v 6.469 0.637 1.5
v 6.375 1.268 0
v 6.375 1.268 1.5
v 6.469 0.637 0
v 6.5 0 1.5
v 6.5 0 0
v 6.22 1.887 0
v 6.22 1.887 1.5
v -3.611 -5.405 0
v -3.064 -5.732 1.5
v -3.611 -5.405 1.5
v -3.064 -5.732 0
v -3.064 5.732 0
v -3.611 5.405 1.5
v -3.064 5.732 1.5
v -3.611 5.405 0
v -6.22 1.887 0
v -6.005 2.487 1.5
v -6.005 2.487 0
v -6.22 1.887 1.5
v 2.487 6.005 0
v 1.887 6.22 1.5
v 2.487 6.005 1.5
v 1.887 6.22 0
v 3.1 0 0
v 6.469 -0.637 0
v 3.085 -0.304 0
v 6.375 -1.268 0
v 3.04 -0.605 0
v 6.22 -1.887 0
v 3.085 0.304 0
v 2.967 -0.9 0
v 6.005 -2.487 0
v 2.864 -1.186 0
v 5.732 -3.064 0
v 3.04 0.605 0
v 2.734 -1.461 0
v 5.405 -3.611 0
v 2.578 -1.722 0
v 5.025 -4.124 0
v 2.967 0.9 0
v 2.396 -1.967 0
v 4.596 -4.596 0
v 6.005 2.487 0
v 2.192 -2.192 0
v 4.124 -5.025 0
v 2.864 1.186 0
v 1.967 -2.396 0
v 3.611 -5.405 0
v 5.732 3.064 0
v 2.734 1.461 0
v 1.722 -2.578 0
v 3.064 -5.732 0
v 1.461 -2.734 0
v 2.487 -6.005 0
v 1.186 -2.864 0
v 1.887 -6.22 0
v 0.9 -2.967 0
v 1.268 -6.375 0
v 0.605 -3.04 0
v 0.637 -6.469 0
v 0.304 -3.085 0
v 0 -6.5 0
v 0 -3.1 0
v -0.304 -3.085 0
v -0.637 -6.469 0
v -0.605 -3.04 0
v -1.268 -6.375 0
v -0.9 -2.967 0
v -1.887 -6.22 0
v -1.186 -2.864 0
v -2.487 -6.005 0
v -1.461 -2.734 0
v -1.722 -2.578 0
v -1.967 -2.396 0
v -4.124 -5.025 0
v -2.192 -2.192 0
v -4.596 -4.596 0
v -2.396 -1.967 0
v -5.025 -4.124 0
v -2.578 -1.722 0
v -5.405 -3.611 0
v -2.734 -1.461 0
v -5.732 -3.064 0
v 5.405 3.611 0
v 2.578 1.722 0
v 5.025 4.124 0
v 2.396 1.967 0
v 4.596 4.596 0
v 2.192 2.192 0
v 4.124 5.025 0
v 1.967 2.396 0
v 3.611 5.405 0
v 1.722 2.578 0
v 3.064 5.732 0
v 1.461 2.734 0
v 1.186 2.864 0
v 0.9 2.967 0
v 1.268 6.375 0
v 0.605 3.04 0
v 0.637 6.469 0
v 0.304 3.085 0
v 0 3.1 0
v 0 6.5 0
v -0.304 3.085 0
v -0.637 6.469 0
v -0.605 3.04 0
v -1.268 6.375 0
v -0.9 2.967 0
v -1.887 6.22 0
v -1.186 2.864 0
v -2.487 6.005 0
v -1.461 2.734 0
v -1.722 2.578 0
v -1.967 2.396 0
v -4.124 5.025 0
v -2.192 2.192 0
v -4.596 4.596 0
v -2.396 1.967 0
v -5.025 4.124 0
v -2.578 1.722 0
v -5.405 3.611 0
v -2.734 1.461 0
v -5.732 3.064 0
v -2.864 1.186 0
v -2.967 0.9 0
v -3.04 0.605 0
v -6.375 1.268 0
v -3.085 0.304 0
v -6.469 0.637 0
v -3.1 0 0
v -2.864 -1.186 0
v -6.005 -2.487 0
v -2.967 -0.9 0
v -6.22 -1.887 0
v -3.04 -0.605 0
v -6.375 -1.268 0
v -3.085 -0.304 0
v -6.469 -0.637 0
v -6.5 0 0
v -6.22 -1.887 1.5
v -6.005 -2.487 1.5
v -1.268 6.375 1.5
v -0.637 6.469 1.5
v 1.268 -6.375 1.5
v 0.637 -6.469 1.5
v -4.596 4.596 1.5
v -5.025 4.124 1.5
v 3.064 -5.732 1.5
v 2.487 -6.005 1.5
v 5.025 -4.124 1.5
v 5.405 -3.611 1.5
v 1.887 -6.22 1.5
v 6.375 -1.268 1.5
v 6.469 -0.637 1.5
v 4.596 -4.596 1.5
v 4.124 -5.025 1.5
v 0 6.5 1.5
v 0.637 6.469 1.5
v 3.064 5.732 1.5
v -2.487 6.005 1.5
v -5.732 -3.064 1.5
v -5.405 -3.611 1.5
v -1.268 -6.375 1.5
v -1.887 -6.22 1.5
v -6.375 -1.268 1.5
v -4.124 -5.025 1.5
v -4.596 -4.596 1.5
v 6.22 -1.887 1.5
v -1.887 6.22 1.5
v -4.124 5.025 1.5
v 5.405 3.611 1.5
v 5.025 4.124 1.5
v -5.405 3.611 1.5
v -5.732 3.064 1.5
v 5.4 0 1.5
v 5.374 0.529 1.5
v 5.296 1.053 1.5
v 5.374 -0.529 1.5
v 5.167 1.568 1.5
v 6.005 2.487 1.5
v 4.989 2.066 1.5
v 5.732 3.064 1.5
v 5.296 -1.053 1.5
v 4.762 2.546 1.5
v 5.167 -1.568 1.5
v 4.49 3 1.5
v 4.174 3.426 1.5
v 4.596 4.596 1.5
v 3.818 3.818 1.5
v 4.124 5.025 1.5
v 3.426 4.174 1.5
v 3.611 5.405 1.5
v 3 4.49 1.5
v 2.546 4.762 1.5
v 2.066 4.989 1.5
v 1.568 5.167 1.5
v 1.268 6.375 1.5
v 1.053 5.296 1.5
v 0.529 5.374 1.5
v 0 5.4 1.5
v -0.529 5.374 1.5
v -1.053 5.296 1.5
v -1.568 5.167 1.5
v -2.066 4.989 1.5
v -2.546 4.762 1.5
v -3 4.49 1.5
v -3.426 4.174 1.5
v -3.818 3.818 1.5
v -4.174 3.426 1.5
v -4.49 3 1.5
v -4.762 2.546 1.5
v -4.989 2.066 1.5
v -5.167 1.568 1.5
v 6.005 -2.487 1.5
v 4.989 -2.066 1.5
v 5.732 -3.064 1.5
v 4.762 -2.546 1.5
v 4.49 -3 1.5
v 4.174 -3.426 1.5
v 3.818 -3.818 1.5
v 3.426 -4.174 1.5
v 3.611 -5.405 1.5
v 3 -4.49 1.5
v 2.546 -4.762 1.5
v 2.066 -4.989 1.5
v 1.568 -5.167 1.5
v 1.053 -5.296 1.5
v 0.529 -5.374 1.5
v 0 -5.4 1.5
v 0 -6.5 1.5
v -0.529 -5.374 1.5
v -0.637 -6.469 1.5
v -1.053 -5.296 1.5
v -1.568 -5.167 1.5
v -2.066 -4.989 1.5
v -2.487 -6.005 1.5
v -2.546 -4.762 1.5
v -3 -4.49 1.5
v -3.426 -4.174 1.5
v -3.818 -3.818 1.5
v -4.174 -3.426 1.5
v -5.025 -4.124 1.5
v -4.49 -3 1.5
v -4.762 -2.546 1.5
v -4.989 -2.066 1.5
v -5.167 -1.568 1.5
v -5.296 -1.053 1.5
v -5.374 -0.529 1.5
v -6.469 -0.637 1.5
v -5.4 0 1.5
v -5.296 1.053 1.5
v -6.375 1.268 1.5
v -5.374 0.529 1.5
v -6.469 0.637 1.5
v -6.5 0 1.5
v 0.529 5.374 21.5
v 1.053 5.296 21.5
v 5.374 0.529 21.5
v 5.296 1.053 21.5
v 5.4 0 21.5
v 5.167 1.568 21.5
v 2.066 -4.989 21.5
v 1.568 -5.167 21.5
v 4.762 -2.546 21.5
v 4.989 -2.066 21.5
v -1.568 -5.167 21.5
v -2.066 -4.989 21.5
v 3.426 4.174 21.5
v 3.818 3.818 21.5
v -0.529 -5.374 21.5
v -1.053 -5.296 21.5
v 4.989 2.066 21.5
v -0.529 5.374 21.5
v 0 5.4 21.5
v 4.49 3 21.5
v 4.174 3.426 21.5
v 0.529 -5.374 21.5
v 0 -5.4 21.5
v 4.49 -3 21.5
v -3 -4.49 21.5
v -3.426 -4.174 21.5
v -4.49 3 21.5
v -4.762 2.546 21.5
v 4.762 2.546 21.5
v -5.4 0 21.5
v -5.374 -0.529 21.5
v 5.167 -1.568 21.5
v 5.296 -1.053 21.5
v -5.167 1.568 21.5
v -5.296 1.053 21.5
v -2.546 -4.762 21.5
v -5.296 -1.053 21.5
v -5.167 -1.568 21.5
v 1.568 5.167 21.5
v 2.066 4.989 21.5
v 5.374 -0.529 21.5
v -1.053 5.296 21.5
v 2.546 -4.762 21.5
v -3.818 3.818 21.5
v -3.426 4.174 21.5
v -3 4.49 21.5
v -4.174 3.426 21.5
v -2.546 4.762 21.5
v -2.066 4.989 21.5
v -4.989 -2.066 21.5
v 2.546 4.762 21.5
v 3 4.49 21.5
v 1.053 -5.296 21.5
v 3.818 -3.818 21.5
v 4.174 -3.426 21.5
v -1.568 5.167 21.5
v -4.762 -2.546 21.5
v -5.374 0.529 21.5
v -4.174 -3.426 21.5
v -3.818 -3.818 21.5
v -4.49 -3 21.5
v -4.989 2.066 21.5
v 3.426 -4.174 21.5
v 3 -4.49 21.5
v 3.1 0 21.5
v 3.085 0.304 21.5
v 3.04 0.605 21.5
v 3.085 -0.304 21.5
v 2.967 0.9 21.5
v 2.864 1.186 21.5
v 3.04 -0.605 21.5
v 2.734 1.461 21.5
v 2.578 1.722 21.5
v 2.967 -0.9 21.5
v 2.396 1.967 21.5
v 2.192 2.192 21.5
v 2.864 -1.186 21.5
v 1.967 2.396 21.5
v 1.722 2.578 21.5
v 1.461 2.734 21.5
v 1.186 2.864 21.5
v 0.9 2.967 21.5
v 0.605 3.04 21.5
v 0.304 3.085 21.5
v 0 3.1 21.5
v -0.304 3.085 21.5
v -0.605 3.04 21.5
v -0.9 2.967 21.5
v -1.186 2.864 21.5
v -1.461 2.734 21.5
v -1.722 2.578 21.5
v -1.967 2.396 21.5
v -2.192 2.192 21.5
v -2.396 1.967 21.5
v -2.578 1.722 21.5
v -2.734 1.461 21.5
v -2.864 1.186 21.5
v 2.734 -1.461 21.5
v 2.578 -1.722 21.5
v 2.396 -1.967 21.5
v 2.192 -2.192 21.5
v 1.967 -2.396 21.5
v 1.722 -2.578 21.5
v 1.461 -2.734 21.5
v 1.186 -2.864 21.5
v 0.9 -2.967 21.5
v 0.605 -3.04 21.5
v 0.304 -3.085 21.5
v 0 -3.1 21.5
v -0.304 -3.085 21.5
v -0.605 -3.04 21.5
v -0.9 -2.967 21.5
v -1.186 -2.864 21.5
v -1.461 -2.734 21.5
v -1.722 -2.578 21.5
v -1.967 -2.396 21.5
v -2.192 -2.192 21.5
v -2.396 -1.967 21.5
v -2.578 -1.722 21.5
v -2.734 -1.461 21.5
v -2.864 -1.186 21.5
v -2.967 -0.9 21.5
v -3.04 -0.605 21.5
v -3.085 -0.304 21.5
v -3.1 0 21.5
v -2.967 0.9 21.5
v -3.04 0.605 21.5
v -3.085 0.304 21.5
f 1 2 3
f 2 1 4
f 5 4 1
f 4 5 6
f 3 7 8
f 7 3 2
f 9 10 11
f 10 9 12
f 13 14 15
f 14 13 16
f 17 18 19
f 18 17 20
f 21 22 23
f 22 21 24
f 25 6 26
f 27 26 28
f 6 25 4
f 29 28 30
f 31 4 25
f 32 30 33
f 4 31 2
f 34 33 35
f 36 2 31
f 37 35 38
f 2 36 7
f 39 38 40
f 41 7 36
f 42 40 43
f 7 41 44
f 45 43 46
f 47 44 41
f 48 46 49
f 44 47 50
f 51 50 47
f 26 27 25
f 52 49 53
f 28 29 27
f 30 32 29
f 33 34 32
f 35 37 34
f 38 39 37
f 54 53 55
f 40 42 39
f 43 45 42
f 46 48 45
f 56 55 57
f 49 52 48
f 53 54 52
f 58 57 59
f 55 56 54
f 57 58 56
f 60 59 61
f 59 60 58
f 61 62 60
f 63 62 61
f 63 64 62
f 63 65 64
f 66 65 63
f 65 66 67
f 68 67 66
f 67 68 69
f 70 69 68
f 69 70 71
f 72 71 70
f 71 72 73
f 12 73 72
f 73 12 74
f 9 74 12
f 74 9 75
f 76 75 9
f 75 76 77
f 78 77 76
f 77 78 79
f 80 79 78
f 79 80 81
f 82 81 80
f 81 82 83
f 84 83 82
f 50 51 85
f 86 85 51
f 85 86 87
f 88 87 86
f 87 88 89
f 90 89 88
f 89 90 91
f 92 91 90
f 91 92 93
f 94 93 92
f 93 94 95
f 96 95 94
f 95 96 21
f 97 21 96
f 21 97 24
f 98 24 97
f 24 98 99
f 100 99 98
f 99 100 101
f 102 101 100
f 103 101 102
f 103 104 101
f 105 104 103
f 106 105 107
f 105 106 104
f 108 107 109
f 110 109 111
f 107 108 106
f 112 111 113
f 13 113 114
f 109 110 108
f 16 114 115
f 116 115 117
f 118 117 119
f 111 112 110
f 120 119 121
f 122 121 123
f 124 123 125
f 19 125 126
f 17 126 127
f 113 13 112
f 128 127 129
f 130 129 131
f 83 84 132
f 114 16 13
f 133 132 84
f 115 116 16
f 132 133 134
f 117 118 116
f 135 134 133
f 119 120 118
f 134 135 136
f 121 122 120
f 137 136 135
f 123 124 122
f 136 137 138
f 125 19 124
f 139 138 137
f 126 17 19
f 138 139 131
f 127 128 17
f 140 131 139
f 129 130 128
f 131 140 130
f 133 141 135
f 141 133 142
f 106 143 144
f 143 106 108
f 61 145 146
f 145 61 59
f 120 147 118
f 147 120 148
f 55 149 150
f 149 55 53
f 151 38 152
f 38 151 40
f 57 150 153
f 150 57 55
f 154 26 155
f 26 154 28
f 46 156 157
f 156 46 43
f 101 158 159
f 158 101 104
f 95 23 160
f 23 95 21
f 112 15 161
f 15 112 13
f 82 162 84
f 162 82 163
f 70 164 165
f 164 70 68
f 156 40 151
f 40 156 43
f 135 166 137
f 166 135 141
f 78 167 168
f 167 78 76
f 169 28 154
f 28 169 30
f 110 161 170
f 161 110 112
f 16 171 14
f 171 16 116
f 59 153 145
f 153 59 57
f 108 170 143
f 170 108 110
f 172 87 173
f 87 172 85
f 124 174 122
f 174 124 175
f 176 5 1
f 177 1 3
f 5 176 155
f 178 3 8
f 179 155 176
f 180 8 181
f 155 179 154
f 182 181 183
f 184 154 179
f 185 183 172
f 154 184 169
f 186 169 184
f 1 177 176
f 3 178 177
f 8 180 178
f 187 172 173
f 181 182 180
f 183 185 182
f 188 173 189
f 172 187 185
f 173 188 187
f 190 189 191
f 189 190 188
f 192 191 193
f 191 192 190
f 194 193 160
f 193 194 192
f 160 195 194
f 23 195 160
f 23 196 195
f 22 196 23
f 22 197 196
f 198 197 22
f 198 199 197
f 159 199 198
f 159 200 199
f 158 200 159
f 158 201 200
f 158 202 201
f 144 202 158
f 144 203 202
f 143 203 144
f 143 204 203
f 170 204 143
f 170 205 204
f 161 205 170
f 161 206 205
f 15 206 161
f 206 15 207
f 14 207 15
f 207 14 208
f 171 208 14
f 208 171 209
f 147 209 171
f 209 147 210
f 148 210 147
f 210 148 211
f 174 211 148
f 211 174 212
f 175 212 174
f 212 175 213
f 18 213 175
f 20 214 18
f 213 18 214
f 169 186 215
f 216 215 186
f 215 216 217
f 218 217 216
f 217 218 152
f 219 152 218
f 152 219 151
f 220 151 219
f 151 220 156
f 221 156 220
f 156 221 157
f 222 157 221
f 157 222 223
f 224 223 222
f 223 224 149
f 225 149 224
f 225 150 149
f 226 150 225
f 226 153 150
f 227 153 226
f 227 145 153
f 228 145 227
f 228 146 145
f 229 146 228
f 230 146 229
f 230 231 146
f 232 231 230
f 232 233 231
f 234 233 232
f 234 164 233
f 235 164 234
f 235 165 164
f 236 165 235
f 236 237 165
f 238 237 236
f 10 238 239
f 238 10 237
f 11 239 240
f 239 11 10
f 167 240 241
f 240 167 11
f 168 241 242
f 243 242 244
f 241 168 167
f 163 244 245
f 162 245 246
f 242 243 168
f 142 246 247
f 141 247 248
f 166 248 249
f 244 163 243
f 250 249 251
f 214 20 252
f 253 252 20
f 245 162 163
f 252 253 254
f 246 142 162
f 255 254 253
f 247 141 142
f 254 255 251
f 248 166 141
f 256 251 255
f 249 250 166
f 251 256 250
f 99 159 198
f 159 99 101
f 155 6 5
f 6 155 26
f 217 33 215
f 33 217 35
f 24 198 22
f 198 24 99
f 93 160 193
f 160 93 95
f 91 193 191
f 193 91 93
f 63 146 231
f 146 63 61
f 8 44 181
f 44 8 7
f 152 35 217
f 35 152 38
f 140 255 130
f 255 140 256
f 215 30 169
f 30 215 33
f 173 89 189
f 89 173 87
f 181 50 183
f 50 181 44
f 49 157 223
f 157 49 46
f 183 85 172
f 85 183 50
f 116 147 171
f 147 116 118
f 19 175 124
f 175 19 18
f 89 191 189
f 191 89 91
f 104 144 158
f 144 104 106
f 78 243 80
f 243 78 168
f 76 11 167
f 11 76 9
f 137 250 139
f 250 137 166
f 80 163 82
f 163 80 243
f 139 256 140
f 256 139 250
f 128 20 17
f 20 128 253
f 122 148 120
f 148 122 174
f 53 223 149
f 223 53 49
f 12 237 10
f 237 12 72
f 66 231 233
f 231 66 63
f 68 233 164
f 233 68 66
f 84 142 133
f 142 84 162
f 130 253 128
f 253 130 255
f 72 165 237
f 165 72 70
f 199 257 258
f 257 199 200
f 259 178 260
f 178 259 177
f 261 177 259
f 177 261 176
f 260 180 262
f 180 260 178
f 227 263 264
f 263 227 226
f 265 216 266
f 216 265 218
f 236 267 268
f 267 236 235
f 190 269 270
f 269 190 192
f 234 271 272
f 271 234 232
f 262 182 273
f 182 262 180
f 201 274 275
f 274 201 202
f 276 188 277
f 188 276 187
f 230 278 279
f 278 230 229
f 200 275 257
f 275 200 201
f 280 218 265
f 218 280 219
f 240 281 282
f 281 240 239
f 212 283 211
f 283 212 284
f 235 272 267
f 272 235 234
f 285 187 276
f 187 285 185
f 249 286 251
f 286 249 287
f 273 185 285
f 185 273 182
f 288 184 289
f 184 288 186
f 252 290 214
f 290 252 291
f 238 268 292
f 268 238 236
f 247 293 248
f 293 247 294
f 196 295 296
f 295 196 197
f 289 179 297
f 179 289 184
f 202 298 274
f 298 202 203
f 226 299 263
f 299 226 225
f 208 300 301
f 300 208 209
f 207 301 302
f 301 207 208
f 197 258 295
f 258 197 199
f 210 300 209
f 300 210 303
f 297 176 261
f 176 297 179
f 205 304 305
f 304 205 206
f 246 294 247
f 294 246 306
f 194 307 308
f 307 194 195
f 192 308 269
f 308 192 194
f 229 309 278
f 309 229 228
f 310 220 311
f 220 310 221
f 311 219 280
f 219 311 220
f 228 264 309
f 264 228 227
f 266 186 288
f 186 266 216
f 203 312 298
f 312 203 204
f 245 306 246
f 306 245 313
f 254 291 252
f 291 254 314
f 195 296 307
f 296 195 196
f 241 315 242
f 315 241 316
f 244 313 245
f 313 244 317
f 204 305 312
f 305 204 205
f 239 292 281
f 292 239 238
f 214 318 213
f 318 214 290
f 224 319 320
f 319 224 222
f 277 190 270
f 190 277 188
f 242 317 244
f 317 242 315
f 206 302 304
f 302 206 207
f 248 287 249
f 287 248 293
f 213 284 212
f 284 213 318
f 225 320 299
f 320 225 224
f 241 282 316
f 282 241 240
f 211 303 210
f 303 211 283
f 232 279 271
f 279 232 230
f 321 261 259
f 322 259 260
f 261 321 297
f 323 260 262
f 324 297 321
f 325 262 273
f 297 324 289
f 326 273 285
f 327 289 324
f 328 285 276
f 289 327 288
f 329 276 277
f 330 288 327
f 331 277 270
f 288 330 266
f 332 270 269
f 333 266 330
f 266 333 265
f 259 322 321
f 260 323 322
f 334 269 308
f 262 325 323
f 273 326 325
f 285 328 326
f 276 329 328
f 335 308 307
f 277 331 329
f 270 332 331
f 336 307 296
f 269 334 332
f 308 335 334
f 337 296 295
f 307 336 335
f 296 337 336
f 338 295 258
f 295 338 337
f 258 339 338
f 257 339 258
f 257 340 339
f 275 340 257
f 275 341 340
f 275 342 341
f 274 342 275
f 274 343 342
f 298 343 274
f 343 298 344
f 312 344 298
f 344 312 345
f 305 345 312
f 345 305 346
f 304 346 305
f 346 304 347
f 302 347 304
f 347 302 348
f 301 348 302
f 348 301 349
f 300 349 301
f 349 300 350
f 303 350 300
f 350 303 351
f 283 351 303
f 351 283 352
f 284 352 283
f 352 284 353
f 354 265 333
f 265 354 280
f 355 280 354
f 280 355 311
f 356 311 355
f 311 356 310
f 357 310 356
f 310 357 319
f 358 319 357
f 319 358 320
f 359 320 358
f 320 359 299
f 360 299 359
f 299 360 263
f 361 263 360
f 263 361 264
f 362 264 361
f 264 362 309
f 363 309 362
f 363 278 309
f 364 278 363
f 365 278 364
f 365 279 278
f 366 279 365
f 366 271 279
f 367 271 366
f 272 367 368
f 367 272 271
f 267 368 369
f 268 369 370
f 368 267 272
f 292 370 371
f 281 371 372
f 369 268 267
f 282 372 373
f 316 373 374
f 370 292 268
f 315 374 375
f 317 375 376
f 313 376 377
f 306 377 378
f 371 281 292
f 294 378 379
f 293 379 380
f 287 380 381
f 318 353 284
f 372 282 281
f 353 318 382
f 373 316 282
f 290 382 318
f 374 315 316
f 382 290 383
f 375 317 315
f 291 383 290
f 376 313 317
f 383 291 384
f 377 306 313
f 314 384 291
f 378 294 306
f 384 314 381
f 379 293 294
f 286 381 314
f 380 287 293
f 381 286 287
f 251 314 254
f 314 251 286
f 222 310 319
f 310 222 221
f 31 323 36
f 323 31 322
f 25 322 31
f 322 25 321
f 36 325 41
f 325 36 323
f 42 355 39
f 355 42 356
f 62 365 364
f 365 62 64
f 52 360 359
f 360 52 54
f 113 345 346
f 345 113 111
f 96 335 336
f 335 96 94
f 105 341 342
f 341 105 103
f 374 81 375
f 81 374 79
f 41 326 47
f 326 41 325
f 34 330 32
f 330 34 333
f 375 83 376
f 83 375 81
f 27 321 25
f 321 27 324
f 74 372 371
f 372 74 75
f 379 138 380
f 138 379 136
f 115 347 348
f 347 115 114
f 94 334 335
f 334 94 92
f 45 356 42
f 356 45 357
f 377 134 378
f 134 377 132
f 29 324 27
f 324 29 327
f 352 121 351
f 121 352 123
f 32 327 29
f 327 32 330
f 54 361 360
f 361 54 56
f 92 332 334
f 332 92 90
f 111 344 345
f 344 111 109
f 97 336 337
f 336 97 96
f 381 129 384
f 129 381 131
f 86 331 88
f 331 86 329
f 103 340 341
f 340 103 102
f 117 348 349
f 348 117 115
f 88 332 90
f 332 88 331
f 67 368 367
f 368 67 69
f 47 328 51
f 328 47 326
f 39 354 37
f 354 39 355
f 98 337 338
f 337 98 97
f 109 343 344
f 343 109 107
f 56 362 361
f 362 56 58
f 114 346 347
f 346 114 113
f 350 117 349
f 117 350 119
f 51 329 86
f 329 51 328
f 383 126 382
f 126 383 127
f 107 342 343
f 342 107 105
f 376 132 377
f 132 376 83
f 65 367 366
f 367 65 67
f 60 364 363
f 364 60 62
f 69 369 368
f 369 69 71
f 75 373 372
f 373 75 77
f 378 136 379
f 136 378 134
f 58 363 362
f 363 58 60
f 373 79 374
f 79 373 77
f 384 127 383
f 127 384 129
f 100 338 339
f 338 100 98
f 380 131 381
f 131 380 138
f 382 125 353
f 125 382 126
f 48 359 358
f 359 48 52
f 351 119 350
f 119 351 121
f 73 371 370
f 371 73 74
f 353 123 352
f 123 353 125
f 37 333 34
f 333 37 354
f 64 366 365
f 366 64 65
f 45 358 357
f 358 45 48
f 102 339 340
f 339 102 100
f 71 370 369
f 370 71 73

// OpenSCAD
// Adapter sleeve: 0.2 mL PCR tube into 1.5 mL tube rack hole
// Dimensions measured with calipers

// Collar (lies on bed, z=0 to 1.5)
collar_dia = 13;
collar_thick = 1.5;

// Sleeve body (rises from collar to z=21.5)
sleeve_od = 10.8;
sleeve_height = 21.5;

// Bore (straight through full height, open both ends)
bore_dia = 6.2;

// Resolution for curved shapes
$fn = 64;

// Build the part in print orientation: collar on bed, sleeve rising up
// The entire solid is constructed first, then the bore is subtracted.
// This ensures the part starts exactly at z=0.

difference() {
    union() {
        // Collar: cylinder on the bed, z=0 to collar_thick
        translate([0, 0, 0])
            cylinder(h = collar_thick, r = collar_dia / 2, center = false);

        // Sleeve body: starts at top of collar (z = collar_thick) and goes to sleeve_height
        translate([0, 0, collar_thick])
            cylinder(h = sleeve_height - collar_thick, r = sleeve_od / 2, center = false);
    }
    
    // Subtract the bore: extends slightly past top and bottom to avoid coplanar faces
    // The bore runs through the full height of the part (z=0 to z=sleeve_height)
    // We extend it 1 mm below z=0 and 1 mm above z=sleeve_height to ensure clean cuts
    translate([0, 0, -1])
        cylinder(h = sleeve_height + 2, r = bore_dia / 2, center = false);
}
